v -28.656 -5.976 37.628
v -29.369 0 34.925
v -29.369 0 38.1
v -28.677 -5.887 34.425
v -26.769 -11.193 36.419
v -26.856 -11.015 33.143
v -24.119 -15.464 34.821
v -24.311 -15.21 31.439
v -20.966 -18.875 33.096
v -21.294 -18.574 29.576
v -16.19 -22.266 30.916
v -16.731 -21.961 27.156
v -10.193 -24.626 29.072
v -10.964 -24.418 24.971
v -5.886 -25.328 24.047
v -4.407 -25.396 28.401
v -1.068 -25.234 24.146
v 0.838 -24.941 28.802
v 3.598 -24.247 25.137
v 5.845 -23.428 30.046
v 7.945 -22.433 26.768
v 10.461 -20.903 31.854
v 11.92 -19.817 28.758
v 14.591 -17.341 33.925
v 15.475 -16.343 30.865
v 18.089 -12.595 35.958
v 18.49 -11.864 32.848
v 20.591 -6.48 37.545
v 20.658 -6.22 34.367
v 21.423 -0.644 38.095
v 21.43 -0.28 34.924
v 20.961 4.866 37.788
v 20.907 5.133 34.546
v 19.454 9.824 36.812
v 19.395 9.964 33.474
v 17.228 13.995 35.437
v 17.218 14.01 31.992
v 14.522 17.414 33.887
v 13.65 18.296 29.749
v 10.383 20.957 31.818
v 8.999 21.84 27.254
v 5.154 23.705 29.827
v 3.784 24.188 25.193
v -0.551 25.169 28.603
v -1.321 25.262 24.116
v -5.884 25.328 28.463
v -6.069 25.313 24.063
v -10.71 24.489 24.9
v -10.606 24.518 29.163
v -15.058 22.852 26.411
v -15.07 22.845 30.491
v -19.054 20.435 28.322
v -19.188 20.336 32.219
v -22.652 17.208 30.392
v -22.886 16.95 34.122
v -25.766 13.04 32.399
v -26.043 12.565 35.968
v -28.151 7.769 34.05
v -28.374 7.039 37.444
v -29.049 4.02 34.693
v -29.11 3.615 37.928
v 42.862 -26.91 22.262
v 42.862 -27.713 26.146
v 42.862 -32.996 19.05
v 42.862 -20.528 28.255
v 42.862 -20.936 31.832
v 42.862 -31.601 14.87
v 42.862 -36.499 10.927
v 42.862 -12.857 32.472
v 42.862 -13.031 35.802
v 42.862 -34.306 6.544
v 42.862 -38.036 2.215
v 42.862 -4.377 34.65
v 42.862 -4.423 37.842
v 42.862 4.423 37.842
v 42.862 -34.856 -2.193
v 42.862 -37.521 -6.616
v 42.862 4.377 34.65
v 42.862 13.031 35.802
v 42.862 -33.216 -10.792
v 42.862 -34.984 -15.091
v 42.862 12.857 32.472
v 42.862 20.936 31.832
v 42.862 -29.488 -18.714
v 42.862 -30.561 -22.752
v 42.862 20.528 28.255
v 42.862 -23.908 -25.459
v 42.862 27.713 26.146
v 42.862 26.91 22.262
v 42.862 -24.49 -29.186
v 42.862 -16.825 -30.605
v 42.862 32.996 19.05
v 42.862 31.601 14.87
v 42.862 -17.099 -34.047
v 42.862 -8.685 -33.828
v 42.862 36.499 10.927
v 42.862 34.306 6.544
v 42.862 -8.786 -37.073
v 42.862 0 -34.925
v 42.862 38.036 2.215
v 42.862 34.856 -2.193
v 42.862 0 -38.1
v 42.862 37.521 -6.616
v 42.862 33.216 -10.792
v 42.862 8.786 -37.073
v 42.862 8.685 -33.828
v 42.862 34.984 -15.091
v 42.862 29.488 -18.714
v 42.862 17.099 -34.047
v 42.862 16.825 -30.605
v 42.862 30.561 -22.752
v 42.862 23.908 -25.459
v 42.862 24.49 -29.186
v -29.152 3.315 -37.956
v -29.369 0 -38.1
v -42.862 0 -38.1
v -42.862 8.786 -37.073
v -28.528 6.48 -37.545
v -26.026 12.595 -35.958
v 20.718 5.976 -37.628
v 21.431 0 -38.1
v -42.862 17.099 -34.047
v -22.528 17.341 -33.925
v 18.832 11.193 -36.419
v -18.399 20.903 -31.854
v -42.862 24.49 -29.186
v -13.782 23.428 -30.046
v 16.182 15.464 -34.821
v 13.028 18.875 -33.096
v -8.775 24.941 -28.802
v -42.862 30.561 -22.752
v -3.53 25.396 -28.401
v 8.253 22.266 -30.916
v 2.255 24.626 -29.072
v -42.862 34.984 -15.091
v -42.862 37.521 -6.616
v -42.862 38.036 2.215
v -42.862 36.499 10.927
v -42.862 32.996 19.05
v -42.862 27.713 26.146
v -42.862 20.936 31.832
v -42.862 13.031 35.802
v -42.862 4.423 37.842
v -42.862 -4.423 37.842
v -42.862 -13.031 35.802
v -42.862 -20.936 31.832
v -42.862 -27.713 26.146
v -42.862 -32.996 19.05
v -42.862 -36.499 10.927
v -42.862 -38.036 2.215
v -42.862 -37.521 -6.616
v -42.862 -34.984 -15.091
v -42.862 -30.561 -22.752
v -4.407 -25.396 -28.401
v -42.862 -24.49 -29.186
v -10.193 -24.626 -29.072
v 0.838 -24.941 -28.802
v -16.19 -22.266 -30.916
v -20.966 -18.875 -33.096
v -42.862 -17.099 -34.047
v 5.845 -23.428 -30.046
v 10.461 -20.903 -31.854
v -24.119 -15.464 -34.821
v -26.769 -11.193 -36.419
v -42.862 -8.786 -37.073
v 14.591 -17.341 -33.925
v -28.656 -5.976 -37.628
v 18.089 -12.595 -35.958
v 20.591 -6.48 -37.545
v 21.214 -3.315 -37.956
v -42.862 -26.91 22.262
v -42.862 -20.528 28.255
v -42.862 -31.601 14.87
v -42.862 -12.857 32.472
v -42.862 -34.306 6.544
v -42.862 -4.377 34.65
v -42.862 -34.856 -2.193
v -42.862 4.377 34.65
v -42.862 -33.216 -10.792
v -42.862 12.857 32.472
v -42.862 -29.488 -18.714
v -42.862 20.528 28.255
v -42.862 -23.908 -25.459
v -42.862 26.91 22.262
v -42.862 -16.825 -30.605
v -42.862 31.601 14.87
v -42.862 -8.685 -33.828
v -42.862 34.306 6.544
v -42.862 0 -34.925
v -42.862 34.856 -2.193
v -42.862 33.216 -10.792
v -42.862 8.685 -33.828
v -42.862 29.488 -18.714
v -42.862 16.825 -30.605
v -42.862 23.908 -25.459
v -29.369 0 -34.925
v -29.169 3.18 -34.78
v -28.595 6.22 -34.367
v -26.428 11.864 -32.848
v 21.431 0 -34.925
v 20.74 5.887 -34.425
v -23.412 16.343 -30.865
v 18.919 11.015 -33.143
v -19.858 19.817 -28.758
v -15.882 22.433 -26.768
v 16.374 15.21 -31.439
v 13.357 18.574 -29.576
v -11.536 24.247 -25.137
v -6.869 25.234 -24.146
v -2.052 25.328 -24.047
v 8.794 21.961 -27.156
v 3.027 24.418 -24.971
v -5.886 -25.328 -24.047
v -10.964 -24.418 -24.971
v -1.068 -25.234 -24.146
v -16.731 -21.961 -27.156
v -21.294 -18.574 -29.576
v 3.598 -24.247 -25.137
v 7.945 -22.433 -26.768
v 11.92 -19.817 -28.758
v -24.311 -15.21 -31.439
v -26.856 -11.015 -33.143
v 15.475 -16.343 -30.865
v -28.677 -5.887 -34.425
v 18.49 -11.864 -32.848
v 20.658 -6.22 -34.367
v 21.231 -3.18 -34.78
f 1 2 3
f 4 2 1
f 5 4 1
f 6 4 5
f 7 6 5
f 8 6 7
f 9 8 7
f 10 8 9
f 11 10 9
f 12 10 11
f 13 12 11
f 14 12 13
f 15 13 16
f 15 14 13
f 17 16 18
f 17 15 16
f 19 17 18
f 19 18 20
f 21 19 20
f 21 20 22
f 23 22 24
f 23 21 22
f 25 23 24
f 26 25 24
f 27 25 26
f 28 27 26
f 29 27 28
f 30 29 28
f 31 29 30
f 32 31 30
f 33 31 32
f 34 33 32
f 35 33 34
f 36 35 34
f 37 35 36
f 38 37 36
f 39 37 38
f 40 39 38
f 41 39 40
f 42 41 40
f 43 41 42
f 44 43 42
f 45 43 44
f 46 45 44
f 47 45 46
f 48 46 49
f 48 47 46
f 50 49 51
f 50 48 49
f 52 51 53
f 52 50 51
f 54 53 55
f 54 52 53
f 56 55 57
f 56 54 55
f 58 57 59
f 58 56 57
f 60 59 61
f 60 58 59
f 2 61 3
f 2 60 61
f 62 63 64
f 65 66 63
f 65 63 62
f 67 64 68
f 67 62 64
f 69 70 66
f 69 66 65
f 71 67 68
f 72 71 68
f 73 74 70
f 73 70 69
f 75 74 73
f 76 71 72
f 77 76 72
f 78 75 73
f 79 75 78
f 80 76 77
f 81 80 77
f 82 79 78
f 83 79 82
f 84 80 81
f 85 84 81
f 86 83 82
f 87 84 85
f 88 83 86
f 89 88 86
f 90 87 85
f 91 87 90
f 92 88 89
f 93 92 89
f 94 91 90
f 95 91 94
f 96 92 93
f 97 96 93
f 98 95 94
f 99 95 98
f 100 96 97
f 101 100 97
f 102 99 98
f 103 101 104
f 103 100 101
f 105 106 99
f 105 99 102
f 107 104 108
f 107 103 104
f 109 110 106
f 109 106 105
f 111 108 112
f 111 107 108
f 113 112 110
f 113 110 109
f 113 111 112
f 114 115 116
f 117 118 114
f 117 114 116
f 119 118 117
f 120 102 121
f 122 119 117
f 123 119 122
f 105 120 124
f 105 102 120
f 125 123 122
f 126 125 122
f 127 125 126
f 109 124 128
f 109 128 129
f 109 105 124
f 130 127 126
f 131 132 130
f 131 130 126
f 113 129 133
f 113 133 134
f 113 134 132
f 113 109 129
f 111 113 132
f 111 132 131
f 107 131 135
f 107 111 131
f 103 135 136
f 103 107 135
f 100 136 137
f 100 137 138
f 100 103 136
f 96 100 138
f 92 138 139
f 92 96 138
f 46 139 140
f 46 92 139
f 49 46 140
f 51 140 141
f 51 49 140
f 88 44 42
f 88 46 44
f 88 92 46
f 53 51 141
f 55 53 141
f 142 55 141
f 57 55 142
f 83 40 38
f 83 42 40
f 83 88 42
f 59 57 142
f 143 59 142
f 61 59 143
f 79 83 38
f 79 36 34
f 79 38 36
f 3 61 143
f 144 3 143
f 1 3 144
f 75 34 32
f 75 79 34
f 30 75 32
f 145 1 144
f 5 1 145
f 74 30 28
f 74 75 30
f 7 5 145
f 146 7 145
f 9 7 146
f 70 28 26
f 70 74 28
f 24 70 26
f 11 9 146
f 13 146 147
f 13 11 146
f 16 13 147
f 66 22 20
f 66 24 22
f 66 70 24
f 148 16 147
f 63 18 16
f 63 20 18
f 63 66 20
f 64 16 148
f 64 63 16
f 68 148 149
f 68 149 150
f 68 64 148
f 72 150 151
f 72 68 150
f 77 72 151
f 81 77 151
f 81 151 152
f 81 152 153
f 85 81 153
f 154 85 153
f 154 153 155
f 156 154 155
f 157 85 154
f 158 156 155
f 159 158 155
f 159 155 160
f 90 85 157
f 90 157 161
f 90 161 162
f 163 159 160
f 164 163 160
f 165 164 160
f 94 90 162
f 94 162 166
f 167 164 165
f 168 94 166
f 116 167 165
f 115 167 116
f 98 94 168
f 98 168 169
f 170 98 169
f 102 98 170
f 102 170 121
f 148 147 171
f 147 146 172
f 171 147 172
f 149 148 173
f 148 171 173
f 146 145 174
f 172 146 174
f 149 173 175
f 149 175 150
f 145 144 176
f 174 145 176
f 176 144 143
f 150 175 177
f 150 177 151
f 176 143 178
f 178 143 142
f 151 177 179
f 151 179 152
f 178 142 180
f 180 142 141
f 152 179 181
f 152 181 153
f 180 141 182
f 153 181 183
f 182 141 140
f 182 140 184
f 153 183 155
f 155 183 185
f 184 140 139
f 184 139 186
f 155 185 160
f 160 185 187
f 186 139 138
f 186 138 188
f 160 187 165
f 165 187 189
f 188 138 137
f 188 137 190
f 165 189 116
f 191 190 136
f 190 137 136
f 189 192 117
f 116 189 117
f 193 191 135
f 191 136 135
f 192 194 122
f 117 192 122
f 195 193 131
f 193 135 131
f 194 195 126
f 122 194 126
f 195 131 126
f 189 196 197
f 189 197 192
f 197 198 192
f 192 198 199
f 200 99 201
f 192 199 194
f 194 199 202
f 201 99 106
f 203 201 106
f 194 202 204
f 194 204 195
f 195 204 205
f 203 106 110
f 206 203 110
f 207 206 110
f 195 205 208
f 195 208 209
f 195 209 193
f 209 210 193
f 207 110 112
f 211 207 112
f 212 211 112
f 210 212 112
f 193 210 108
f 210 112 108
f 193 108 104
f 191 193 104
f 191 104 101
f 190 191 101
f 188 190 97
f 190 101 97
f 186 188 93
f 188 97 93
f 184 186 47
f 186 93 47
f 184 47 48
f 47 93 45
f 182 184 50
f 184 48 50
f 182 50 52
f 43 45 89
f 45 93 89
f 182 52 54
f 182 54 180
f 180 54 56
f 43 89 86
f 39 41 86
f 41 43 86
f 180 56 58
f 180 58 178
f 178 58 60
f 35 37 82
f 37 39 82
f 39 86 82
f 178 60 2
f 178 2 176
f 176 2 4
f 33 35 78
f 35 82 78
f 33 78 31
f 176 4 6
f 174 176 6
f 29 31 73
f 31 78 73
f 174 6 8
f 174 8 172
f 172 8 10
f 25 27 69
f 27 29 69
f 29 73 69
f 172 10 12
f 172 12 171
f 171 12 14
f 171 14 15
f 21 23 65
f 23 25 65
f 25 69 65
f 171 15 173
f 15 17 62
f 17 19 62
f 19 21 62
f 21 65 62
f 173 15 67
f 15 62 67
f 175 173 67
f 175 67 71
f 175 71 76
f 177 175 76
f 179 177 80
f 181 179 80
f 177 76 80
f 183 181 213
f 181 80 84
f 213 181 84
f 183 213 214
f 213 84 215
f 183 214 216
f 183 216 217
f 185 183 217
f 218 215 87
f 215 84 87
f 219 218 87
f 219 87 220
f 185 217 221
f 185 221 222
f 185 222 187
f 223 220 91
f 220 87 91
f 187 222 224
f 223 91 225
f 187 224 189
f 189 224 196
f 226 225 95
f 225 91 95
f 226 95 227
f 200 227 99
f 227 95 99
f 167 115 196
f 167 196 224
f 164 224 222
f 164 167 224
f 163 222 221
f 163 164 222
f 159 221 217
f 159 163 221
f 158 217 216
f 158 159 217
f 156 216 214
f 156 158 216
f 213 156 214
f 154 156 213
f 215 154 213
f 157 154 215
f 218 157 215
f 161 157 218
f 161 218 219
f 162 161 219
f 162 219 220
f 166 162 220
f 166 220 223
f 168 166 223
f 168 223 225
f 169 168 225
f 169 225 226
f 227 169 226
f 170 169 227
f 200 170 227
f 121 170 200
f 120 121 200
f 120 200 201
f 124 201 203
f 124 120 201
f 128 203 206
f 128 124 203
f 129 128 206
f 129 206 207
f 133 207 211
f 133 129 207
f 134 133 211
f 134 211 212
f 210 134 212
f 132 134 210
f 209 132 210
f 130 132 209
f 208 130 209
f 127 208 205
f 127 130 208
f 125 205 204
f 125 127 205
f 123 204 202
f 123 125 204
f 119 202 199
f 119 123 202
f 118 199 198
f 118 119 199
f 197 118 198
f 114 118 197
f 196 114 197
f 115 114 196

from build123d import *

# Parameters (mm, degrees)
SKETCH1_R               = 38.1
BOSS_EXTRUDE1_DEPTH     = 42.8625
SHELL1_T                = -3.175
CUT_EXTRUDE1_DEPTH      = 69.850663804
CUT_EXTRUDE1_DEPTH_BACK = 69.850663804
SKETCH2_R               = 25.4


with BuildPart() as part:
    # Sketch1 → Boss-Extrude1 (new, symmetric)
    with BuildSketch(Plane(origin=(0, 0, 0), x_dir=(0, 0, -1), z_dir=(1, 0, 0))):
        Circle(SKETCH1_R)
    extrude(amount=BOSS_EXTRUDE1_DEPTH, both=True)

    # Shell1
    shell1_openings = [part.faces().sort_by_distance(p)[0] for p in [
        (42.8625, 0, 0),
        (-42.8625, 0, 0),
    ]]
    offset(amount=SHELL1_T, openings=shell1_openings, kind=Kind.INTERSECTION)

    # Sketch2 → Cut-Extrude1 (cut, two sides: drawn at the far end of the back side and taken through both)
    with BuildSketch(Plane.XY.offset(-CUT_EXTRUDE1_DEPTH_BACK)):
        with Locations(Location((-3.96875, 0, 0), (0, 0, 180))):
            Circle(SKETCH2_R)
    extrude(amount=CUT_EXTRUDE1_DEPTH + CUT_EXTRUDE1_DEPTH_BACK, mode=Mode.SUBTRACT)


solid = part.part
